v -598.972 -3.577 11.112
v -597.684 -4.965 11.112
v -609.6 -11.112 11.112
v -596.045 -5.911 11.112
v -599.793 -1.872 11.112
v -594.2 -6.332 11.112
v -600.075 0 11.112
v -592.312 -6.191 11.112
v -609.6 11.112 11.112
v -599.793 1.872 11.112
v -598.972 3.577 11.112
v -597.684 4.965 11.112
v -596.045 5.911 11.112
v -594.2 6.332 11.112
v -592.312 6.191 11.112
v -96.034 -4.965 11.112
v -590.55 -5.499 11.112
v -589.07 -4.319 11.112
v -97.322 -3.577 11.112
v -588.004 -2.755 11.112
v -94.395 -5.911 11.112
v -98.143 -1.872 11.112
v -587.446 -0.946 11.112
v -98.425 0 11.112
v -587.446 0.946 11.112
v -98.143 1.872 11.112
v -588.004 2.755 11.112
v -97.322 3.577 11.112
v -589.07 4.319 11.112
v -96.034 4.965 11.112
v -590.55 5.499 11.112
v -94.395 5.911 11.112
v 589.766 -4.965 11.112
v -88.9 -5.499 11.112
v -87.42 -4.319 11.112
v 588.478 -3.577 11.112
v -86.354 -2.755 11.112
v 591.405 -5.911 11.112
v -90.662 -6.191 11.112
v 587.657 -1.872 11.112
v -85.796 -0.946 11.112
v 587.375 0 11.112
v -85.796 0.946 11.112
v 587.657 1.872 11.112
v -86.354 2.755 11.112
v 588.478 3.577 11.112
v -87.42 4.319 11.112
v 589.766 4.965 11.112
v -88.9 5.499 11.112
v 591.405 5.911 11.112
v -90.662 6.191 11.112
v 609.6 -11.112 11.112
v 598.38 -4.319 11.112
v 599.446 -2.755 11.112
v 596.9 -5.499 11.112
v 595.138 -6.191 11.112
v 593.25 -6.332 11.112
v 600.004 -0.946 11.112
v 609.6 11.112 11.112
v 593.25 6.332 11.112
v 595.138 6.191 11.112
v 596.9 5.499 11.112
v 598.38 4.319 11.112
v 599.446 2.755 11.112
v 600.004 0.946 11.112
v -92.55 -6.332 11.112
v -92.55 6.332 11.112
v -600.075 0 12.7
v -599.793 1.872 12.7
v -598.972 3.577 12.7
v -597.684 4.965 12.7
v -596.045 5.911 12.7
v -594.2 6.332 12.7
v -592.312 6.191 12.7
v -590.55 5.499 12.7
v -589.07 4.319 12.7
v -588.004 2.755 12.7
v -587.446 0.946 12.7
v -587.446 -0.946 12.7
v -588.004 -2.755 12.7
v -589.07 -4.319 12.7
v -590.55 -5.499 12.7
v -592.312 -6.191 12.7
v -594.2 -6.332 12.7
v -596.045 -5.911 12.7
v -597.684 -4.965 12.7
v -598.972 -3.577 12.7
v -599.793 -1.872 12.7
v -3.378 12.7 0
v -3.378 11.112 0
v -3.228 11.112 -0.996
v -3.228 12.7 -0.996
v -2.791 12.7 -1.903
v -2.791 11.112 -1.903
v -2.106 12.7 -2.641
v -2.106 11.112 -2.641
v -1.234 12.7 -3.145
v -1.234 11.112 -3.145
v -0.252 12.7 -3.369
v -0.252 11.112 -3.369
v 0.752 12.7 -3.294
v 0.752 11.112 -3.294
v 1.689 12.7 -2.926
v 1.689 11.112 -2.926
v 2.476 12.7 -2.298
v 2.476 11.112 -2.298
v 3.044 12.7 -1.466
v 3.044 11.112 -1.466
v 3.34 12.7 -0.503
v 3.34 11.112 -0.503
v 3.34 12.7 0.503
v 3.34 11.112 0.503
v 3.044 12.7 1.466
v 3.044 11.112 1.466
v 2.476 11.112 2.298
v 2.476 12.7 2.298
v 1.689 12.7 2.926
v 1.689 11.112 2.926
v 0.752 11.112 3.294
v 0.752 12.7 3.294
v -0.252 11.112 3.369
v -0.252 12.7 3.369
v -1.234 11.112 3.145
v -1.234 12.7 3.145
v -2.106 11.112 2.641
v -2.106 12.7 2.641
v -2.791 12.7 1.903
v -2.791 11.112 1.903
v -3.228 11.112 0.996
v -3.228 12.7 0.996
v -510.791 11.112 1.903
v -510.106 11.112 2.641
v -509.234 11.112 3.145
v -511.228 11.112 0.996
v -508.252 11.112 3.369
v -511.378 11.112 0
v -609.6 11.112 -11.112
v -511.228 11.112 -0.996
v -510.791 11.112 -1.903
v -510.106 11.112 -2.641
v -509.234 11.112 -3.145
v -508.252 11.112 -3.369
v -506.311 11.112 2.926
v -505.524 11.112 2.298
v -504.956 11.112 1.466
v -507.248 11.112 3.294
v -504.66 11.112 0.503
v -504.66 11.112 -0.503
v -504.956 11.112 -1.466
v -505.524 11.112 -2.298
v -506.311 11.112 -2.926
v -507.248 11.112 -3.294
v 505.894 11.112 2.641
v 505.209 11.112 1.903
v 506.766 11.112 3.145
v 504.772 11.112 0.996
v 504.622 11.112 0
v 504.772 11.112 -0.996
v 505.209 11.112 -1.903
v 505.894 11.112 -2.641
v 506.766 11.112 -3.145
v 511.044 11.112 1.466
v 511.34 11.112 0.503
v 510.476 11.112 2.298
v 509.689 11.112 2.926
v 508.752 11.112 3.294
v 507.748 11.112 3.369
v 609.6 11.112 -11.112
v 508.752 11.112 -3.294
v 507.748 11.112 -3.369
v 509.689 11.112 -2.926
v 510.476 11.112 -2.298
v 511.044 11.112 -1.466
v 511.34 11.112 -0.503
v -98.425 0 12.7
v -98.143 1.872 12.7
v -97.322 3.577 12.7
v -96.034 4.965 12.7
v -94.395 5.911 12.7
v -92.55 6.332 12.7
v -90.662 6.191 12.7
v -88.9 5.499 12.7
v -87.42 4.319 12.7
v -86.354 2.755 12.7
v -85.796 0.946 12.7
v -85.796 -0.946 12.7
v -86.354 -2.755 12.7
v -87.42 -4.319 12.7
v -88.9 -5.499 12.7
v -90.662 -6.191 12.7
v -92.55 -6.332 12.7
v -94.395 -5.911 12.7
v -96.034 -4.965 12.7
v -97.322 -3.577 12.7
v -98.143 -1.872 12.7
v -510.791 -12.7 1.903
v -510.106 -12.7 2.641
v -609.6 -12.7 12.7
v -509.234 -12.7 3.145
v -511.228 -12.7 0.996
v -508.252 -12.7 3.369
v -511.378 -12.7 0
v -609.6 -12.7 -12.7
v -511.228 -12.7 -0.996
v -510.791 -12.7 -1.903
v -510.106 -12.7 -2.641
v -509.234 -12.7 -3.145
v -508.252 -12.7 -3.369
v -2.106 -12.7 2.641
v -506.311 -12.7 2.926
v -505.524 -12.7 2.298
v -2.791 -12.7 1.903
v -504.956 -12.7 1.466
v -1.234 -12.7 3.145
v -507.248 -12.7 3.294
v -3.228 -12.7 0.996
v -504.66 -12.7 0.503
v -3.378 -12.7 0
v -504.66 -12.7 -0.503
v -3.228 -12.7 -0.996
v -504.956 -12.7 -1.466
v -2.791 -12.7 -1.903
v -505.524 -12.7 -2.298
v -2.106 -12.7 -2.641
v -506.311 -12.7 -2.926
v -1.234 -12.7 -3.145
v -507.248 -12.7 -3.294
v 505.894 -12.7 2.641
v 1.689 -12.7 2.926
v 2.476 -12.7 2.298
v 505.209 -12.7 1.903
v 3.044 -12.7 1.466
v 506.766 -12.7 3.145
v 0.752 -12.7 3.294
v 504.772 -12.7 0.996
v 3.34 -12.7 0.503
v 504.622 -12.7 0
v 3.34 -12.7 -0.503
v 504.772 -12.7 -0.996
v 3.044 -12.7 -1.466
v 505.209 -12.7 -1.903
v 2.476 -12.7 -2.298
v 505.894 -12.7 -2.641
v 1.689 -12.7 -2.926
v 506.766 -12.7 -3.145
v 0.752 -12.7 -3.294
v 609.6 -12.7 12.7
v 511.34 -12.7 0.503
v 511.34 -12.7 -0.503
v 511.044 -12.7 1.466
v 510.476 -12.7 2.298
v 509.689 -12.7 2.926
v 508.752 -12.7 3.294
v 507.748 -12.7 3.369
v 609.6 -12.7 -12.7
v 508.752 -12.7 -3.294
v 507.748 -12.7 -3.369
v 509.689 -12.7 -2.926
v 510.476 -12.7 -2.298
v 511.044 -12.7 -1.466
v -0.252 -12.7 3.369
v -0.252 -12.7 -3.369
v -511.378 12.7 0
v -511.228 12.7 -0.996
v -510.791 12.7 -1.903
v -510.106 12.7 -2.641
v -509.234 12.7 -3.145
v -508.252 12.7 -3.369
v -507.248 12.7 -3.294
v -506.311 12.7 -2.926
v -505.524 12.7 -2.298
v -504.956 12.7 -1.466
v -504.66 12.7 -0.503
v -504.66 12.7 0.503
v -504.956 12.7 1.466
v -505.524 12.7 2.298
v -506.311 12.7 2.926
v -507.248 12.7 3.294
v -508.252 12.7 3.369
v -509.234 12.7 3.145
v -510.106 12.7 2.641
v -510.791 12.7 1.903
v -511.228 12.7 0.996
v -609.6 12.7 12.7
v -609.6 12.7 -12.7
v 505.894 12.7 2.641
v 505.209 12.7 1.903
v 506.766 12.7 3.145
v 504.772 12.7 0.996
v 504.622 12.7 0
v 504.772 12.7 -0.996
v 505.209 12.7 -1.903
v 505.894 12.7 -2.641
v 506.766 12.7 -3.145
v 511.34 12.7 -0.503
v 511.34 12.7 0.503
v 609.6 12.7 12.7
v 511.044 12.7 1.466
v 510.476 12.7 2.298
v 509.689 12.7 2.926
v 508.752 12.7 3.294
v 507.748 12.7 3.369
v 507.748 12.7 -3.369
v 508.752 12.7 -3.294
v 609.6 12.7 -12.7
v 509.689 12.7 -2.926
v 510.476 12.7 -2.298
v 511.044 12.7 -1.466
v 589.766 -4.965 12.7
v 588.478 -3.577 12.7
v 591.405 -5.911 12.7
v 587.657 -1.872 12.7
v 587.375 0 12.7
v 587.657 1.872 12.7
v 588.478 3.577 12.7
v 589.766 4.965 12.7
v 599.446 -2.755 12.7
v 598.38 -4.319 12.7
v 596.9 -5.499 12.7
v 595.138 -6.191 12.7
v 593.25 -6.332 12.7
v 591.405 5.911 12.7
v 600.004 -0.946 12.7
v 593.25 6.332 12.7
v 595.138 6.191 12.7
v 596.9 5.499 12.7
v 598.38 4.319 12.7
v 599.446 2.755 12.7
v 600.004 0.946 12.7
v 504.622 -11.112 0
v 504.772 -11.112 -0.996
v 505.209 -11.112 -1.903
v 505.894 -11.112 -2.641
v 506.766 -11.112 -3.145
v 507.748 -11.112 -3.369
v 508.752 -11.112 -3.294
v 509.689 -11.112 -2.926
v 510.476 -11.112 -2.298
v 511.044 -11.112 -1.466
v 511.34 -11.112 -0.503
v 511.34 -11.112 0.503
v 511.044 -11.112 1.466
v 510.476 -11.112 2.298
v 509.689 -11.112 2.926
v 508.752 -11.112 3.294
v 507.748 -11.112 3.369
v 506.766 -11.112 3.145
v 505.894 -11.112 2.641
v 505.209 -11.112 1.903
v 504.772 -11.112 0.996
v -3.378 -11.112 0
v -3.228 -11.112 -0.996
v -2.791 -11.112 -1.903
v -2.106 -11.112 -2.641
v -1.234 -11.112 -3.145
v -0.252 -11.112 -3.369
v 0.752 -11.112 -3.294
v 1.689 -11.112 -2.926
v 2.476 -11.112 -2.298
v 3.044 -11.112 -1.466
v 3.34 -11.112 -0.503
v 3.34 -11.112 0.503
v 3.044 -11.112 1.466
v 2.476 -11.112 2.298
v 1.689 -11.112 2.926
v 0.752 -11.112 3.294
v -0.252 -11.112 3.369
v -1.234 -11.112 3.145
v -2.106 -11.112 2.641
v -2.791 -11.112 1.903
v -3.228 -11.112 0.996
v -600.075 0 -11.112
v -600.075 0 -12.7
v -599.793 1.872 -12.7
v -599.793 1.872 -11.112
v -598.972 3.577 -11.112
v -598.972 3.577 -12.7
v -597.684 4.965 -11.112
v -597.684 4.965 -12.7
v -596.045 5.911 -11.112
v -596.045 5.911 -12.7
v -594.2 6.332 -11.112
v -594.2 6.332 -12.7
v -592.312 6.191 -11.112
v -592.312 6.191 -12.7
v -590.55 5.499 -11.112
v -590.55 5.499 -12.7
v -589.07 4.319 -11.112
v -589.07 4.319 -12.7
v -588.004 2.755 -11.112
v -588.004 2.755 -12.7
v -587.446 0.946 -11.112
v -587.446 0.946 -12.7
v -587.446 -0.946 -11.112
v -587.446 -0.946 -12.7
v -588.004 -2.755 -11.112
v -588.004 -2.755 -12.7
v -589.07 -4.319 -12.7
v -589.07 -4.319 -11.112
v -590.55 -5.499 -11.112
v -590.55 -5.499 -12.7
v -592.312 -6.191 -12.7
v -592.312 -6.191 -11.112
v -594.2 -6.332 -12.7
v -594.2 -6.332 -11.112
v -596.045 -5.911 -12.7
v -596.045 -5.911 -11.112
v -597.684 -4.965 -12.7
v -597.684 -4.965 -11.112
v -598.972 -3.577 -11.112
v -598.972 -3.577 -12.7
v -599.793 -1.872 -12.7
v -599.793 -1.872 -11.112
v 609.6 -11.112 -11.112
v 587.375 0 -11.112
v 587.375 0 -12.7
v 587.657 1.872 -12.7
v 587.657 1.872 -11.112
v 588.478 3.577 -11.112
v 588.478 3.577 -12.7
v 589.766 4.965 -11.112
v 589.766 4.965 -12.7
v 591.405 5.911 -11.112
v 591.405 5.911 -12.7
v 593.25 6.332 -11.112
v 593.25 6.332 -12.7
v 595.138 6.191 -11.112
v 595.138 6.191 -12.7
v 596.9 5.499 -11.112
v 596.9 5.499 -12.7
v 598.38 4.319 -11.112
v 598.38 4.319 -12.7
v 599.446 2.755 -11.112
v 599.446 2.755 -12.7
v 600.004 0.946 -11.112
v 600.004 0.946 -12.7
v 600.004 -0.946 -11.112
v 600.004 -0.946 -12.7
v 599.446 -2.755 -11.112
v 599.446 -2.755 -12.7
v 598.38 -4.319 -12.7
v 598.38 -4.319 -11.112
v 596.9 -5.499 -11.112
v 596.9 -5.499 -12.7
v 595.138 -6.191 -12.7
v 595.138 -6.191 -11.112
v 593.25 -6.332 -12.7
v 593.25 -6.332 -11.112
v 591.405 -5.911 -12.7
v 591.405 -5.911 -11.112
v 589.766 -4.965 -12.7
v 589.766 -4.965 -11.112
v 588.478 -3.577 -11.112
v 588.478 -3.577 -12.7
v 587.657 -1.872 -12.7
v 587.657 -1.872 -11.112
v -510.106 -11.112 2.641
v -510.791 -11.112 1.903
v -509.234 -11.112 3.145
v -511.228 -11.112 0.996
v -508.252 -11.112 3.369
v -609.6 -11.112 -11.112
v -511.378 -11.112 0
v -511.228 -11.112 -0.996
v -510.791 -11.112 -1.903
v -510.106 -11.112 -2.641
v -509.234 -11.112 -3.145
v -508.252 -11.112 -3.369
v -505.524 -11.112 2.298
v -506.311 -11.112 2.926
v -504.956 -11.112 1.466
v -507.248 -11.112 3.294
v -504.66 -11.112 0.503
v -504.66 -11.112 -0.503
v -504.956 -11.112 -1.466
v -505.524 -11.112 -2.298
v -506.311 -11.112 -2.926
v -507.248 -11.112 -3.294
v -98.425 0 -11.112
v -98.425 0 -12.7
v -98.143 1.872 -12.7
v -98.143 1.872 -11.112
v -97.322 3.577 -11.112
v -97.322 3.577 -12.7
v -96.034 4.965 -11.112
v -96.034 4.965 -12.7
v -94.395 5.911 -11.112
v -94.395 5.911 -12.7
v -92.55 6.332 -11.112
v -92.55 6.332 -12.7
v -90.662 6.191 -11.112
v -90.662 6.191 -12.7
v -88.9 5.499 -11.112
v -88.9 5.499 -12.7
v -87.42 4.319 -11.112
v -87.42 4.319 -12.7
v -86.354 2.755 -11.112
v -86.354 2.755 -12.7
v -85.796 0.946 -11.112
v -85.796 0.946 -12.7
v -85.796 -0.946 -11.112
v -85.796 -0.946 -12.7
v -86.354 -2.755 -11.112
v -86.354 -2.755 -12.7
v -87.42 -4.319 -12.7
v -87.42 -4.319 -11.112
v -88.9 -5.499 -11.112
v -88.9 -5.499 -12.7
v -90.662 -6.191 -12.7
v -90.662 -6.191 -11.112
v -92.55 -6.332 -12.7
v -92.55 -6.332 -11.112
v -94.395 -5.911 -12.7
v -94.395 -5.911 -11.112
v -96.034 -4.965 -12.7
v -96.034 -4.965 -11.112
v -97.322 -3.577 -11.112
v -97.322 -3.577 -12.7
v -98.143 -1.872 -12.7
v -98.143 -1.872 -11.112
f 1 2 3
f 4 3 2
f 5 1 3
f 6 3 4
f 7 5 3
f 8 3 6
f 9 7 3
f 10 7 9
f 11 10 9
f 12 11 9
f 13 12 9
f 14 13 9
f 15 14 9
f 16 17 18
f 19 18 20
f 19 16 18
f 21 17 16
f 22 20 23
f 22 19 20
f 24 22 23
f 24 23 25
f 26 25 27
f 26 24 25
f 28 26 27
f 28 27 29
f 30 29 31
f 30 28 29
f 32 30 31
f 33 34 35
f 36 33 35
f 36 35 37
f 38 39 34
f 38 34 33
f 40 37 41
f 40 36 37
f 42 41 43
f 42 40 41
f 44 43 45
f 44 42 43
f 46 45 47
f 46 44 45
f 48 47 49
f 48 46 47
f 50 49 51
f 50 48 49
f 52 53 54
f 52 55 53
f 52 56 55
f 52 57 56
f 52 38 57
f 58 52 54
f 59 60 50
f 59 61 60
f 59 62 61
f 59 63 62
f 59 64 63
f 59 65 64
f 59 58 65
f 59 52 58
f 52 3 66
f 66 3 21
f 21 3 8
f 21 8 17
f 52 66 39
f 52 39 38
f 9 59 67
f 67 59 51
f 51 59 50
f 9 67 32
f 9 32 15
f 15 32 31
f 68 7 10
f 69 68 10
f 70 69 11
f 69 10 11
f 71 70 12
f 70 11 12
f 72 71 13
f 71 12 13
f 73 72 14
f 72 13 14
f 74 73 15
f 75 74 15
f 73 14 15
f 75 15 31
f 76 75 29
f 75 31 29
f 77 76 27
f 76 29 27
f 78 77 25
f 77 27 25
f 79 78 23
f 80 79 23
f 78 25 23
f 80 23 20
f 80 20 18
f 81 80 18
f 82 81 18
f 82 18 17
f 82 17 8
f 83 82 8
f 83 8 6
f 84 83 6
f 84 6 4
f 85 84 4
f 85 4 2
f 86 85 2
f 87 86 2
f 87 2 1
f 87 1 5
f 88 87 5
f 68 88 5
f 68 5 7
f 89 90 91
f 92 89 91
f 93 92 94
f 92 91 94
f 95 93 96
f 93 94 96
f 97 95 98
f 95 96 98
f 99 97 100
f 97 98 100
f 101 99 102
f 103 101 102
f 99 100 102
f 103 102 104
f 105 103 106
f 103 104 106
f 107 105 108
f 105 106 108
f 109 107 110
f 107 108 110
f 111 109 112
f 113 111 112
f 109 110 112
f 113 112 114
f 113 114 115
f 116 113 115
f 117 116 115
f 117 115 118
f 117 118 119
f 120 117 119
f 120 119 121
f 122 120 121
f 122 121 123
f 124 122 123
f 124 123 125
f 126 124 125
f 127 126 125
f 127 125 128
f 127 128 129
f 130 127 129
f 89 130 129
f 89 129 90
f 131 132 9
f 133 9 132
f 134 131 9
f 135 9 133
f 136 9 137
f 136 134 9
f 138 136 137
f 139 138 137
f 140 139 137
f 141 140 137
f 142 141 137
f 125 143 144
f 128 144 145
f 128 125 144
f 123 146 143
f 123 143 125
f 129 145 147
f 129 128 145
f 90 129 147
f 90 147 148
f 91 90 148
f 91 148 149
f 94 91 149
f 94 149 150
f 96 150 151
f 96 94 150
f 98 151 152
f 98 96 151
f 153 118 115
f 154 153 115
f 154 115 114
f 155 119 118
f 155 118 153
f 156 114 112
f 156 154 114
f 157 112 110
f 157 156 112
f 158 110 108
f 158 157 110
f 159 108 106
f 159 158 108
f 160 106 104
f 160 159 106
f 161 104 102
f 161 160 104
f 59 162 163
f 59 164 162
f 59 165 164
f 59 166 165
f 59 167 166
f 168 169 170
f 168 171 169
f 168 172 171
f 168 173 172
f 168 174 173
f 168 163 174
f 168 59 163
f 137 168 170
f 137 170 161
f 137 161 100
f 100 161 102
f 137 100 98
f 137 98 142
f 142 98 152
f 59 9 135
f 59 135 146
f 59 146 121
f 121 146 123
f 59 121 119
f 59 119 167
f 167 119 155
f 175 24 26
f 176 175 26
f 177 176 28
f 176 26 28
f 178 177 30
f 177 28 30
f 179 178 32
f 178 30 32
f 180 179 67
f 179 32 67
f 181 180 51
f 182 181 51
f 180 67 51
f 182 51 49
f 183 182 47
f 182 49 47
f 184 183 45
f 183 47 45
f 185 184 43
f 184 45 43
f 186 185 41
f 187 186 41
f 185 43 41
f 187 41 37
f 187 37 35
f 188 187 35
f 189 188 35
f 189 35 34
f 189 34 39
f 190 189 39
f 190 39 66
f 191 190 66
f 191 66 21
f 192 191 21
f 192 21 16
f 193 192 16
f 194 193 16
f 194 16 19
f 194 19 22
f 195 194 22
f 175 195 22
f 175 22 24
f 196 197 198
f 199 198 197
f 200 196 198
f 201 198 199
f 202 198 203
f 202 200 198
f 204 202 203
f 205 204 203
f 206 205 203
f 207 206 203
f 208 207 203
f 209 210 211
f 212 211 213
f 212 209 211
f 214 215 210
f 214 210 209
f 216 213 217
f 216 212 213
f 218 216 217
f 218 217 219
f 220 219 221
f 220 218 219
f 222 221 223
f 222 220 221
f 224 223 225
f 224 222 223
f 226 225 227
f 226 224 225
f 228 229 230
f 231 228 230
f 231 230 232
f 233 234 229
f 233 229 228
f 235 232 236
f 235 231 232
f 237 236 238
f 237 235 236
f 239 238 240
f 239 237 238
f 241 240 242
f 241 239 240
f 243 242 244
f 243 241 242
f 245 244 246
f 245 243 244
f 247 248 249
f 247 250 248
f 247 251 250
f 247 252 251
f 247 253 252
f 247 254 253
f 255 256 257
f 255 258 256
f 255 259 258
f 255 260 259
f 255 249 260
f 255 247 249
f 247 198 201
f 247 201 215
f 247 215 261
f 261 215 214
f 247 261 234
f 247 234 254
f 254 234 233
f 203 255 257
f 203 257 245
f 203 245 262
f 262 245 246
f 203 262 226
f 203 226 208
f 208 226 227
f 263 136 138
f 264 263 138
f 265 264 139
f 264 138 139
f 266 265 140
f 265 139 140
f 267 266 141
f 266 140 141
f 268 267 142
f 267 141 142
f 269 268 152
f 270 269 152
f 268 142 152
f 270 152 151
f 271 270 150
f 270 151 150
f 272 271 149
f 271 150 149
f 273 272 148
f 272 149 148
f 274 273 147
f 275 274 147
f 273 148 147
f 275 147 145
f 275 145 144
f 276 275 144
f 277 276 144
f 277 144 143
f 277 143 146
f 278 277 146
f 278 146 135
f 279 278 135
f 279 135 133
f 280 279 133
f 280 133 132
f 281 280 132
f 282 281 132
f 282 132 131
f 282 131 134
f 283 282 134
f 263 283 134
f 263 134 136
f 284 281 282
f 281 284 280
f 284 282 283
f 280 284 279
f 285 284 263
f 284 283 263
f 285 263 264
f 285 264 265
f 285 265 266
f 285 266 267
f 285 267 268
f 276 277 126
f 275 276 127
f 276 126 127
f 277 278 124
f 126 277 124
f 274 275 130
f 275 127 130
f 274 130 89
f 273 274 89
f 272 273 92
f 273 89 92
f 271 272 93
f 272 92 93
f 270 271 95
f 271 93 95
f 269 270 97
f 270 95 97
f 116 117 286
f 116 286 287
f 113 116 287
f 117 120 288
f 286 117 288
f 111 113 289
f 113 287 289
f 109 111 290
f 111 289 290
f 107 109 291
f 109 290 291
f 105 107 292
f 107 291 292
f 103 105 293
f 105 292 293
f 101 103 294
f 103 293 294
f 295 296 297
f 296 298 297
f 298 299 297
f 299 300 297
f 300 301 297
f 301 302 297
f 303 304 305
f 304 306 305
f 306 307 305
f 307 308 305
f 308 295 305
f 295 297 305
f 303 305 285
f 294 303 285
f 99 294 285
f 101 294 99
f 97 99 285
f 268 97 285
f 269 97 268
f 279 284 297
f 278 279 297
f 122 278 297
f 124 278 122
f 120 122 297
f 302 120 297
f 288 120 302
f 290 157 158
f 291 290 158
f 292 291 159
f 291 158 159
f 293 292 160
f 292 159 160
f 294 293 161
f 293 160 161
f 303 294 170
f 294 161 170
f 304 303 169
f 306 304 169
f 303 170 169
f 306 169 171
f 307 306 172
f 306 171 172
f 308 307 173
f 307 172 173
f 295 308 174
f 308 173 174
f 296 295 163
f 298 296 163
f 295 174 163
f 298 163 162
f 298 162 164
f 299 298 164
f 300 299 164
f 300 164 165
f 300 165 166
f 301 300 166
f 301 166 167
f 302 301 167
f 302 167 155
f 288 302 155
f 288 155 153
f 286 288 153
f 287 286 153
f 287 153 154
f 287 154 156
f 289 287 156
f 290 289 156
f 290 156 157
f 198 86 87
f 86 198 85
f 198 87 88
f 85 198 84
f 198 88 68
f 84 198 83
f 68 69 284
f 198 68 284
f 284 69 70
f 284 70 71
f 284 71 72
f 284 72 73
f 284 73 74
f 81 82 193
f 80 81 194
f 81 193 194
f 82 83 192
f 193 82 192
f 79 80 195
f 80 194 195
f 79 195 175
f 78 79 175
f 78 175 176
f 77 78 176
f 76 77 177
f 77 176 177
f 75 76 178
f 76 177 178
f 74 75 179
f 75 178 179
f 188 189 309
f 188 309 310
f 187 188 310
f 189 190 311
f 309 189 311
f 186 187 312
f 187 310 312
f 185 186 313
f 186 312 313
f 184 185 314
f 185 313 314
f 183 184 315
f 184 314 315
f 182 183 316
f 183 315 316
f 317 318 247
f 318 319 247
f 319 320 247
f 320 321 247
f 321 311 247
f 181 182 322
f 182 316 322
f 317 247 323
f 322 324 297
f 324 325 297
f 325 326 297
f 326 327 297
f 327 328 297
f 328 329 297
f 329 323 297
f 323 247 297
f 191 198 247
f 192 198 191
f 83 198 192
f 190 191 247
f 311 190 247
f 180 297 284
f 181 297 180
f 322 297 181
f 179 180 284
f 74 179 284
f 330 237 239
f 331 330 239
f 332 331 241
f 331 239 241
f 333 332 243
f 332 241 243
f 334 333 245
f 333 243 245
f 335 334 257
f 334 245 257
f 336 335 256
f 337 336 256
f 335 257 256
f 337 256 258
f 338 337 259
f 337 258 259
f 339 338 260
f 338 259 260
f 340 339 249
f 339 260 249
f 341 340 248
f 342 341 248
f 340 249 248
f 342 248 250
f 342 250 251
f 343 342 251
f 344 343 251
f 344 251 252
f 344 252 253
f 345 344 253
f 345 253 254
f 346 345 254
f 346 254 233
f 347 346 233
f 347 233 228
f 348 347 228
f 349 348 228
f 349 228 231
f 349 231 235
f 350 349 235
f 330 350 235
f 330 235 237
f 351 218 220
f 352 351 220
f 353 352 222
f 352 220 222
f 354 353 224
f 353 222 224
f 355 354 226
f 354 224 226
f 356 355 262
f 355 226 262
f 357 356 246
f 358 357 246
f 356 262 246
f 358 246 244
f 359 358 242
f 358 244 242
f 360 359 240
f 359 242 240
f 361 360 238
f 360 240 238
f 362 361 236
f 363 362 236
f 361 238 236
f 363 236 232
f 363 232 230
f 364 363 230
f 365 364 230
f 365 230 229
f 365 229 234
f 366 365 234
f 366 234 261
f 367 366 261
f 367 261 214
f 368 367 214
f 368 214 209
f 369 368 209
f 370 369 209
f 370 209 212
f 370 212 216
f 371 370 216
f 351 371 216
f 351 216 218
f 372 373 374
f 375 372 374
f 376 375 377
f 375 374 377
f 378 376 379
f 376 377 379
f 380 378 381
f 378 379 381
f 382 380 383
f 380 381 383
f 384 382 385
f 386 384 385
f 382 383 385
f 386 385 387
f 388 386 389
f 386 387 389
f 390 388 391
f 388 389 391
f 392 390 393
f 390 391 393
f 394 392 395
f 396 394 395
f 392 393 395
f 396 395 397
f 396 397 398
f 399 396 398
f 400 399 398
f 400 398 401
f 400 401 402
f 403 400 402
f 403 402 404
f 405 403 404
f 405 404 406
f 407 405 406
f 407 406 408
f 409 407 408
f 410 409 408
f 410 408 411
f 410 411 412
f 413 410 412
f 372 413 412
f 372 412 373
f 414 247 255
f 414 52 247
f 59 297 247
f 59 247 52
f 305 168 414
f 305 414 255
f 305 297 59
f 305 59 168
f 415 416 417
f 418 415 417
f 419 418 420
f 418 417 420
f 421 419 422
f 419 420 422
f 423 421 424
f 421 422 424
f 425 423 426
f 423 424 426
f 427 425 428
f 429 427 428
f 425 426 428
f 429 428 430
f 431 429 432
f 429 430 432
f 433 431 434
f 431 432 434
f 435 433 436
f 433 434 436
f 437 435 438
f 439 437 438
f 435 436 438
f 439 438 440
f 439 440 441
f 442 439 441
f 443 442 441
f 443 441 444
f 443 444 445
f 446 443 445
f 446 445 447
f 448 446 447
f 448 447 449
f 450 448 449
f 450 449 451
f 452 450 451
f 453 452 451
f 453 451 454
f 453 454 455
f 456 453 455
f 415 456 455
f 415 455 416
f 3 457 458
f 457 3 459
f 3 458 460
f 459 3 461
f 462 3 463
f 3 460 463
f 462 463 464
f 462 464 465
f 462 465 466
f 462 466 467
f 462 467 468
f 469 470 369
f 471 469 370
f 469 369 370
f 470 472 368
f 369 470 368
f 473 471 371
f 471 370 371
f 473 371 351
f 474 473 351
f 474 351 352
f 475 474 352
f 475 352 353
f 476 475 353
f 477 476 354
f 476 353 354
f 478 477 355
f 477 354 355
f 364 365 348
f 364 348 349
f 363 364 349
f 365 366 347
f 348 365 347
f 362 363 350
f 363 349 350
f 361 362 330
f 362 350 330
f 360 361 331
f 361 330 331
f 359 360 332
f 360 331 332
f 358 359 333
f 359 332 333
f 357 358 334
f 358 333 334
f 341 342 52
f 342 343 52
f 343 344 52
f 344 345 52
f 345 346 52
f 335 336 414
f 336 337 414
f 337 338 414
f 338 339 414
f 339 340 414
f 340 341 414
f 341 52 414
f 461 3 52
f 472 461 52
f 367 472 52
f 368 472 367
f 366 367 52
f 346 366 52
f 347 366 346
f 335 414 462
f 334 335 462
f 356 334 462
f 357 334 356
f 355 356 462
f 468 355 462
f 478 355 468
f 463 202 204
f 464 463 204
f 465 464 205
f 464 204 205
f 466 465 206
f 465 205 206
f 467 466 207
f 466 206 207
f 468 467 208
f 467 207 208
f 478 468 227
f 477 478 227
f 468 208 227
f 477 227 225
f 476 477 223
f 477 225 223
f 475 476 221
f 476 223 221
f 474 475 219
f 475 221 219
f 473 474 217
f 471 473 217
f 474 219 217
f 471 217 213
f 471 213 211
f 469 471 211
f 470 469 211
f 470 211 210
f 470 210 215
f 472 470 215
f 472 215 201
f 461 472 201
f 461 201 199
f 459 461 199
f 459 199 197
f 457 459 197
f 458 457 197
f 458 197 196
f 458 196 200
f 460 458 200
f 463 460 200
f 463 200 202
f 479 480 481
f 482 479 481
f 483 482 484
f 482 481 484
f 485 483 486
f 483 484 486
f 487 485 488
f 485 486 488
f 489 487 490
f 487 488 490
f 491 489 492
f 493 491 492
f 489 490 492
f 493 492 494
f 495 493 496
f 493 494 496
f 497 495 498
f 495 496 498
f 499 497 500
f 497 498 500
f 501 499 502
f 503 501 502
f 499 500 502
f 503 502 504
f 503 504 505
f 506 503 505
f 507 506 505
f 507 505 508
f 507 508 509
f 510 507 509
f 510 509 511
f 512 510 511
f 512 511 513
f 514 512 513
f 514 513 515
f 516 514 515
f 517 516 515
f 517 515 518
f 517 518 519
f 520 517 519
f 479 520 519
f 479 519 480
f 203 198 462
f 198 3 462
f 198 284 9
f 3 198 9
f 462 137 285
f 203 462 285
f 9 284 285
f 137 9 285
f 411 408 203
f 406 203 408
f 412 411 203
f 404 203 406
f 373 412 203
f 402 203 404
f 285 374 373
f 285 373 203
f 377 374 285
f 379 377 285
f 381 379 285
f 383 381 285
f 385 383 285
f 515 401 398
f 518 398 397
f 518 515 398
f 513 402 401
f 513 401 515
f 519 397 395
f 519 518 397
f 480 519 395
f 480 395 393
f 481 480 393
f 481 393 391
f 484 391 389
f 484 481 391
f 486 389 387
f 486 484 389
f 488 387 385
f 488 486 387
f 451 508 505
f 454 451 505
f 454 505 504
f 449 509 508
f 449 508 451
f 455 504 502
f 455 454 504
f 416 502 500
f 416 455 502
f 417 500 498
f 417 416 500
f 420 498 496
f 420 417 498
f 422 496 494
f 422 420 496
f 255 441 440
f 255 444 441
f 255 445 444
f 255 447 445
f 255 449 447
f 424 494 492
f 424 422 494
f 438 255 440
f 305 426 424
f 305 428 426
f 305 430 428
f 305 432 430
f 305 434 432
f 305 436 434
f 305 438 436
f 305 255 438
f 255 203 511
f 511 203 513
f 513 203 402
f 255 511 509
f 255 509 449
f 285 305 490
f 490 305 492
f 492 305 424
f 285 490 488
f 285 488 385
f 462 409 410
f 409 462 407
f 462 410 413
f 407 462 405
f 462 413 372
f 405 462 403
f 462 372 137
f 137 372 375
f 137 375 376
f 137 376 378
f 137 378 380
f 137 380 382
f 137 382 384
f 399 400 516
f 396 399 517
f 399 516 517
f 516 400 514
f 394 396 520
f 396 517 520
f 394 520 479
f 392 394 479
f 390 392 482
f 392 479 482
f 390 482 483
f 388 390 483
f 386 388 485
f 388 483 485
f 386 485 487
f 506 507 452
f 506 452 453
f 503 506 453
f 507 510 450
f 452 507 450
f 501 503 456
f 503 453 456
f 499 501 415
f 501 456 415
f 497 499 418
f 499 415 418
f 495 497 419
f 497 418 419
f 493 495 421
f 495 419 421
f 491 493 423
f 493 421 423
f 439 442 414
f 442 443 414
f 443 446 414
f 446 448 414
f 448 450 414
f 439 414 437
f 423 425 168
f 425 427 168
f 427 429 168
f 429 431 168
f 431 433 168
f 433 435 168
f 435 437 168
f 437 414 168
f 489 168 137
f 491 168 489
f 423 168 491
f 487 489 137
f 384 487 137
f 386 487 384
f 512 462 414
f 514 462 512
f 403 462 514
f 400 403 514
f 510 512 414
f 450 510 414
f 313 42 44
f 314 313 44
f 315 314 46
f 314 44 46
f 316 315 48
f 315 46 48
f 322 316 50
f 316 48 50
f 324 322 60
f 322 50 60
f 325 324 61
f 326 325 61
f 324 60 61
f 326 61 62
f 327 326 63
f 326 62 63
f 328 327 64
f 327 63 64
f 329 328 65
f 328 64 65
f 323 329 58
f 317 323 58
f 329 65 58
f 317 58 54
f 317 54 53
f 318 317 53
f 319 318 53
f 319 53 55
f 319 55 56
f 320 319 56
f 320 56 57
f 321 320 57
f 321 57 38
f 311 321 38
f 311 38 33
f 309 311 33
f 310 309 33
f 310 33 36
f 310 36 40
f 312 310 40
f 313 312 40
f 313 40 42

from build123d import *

# Parameters (mm, degrees)
SKETCH1_W                  = 25.4
SKETCH1_H                  = 25.4
SKETCH1_W_2                = 22.225
SKETCH1_H_2                = 22.225
EXTRUDE_THIN1_DEPTH        = 609.6
F_1_2_0_5_DIAMETER_HOLE1_D = 12.7
F_1_4_CLEARANCE_HOLE1_D    = 6.7564


with BuildPart() as part:
    # Sketch1 → Extrude-Thin1 (new, symmetric)
    with BuildSketch(Plane(origin=(0, 0, 0), x_dir=(0, 0, -1), z_dir=(1, 0, 0))):
        Rectangle(SKETCH1_W, SKETCH1_H)
        Rectangle(SKETCH1_W_2, SKETCH1_H_2, mode=Mode.SUBTRACT)
    extrude(amount=EXTRUDE_THIN1_DEPTH, both=True)

    # 1/2 (0.5) Diameter Hole1 (through all)
    with Locations(Plane.XY.offset(12.7)):
        with Locations((-593.725, 0), (593.725, 0), (-92.075, 0)):
            Hole(F_1_2_0_5_DIAMETER_HOLE1_D / 2)

    # 1/4 Clearance Hole1 (through all)
    with Locations(Plane(origin=(0, 12.7, 0), x_dir=(1, 0, 0), z_dir=(0, 1, 0))):
        with Locations((-508, 0), (0, 0), (508, 0)):
            Hole(F_1_4_CLEARANCE_HOLE1_D / 2)


solid = part.part
